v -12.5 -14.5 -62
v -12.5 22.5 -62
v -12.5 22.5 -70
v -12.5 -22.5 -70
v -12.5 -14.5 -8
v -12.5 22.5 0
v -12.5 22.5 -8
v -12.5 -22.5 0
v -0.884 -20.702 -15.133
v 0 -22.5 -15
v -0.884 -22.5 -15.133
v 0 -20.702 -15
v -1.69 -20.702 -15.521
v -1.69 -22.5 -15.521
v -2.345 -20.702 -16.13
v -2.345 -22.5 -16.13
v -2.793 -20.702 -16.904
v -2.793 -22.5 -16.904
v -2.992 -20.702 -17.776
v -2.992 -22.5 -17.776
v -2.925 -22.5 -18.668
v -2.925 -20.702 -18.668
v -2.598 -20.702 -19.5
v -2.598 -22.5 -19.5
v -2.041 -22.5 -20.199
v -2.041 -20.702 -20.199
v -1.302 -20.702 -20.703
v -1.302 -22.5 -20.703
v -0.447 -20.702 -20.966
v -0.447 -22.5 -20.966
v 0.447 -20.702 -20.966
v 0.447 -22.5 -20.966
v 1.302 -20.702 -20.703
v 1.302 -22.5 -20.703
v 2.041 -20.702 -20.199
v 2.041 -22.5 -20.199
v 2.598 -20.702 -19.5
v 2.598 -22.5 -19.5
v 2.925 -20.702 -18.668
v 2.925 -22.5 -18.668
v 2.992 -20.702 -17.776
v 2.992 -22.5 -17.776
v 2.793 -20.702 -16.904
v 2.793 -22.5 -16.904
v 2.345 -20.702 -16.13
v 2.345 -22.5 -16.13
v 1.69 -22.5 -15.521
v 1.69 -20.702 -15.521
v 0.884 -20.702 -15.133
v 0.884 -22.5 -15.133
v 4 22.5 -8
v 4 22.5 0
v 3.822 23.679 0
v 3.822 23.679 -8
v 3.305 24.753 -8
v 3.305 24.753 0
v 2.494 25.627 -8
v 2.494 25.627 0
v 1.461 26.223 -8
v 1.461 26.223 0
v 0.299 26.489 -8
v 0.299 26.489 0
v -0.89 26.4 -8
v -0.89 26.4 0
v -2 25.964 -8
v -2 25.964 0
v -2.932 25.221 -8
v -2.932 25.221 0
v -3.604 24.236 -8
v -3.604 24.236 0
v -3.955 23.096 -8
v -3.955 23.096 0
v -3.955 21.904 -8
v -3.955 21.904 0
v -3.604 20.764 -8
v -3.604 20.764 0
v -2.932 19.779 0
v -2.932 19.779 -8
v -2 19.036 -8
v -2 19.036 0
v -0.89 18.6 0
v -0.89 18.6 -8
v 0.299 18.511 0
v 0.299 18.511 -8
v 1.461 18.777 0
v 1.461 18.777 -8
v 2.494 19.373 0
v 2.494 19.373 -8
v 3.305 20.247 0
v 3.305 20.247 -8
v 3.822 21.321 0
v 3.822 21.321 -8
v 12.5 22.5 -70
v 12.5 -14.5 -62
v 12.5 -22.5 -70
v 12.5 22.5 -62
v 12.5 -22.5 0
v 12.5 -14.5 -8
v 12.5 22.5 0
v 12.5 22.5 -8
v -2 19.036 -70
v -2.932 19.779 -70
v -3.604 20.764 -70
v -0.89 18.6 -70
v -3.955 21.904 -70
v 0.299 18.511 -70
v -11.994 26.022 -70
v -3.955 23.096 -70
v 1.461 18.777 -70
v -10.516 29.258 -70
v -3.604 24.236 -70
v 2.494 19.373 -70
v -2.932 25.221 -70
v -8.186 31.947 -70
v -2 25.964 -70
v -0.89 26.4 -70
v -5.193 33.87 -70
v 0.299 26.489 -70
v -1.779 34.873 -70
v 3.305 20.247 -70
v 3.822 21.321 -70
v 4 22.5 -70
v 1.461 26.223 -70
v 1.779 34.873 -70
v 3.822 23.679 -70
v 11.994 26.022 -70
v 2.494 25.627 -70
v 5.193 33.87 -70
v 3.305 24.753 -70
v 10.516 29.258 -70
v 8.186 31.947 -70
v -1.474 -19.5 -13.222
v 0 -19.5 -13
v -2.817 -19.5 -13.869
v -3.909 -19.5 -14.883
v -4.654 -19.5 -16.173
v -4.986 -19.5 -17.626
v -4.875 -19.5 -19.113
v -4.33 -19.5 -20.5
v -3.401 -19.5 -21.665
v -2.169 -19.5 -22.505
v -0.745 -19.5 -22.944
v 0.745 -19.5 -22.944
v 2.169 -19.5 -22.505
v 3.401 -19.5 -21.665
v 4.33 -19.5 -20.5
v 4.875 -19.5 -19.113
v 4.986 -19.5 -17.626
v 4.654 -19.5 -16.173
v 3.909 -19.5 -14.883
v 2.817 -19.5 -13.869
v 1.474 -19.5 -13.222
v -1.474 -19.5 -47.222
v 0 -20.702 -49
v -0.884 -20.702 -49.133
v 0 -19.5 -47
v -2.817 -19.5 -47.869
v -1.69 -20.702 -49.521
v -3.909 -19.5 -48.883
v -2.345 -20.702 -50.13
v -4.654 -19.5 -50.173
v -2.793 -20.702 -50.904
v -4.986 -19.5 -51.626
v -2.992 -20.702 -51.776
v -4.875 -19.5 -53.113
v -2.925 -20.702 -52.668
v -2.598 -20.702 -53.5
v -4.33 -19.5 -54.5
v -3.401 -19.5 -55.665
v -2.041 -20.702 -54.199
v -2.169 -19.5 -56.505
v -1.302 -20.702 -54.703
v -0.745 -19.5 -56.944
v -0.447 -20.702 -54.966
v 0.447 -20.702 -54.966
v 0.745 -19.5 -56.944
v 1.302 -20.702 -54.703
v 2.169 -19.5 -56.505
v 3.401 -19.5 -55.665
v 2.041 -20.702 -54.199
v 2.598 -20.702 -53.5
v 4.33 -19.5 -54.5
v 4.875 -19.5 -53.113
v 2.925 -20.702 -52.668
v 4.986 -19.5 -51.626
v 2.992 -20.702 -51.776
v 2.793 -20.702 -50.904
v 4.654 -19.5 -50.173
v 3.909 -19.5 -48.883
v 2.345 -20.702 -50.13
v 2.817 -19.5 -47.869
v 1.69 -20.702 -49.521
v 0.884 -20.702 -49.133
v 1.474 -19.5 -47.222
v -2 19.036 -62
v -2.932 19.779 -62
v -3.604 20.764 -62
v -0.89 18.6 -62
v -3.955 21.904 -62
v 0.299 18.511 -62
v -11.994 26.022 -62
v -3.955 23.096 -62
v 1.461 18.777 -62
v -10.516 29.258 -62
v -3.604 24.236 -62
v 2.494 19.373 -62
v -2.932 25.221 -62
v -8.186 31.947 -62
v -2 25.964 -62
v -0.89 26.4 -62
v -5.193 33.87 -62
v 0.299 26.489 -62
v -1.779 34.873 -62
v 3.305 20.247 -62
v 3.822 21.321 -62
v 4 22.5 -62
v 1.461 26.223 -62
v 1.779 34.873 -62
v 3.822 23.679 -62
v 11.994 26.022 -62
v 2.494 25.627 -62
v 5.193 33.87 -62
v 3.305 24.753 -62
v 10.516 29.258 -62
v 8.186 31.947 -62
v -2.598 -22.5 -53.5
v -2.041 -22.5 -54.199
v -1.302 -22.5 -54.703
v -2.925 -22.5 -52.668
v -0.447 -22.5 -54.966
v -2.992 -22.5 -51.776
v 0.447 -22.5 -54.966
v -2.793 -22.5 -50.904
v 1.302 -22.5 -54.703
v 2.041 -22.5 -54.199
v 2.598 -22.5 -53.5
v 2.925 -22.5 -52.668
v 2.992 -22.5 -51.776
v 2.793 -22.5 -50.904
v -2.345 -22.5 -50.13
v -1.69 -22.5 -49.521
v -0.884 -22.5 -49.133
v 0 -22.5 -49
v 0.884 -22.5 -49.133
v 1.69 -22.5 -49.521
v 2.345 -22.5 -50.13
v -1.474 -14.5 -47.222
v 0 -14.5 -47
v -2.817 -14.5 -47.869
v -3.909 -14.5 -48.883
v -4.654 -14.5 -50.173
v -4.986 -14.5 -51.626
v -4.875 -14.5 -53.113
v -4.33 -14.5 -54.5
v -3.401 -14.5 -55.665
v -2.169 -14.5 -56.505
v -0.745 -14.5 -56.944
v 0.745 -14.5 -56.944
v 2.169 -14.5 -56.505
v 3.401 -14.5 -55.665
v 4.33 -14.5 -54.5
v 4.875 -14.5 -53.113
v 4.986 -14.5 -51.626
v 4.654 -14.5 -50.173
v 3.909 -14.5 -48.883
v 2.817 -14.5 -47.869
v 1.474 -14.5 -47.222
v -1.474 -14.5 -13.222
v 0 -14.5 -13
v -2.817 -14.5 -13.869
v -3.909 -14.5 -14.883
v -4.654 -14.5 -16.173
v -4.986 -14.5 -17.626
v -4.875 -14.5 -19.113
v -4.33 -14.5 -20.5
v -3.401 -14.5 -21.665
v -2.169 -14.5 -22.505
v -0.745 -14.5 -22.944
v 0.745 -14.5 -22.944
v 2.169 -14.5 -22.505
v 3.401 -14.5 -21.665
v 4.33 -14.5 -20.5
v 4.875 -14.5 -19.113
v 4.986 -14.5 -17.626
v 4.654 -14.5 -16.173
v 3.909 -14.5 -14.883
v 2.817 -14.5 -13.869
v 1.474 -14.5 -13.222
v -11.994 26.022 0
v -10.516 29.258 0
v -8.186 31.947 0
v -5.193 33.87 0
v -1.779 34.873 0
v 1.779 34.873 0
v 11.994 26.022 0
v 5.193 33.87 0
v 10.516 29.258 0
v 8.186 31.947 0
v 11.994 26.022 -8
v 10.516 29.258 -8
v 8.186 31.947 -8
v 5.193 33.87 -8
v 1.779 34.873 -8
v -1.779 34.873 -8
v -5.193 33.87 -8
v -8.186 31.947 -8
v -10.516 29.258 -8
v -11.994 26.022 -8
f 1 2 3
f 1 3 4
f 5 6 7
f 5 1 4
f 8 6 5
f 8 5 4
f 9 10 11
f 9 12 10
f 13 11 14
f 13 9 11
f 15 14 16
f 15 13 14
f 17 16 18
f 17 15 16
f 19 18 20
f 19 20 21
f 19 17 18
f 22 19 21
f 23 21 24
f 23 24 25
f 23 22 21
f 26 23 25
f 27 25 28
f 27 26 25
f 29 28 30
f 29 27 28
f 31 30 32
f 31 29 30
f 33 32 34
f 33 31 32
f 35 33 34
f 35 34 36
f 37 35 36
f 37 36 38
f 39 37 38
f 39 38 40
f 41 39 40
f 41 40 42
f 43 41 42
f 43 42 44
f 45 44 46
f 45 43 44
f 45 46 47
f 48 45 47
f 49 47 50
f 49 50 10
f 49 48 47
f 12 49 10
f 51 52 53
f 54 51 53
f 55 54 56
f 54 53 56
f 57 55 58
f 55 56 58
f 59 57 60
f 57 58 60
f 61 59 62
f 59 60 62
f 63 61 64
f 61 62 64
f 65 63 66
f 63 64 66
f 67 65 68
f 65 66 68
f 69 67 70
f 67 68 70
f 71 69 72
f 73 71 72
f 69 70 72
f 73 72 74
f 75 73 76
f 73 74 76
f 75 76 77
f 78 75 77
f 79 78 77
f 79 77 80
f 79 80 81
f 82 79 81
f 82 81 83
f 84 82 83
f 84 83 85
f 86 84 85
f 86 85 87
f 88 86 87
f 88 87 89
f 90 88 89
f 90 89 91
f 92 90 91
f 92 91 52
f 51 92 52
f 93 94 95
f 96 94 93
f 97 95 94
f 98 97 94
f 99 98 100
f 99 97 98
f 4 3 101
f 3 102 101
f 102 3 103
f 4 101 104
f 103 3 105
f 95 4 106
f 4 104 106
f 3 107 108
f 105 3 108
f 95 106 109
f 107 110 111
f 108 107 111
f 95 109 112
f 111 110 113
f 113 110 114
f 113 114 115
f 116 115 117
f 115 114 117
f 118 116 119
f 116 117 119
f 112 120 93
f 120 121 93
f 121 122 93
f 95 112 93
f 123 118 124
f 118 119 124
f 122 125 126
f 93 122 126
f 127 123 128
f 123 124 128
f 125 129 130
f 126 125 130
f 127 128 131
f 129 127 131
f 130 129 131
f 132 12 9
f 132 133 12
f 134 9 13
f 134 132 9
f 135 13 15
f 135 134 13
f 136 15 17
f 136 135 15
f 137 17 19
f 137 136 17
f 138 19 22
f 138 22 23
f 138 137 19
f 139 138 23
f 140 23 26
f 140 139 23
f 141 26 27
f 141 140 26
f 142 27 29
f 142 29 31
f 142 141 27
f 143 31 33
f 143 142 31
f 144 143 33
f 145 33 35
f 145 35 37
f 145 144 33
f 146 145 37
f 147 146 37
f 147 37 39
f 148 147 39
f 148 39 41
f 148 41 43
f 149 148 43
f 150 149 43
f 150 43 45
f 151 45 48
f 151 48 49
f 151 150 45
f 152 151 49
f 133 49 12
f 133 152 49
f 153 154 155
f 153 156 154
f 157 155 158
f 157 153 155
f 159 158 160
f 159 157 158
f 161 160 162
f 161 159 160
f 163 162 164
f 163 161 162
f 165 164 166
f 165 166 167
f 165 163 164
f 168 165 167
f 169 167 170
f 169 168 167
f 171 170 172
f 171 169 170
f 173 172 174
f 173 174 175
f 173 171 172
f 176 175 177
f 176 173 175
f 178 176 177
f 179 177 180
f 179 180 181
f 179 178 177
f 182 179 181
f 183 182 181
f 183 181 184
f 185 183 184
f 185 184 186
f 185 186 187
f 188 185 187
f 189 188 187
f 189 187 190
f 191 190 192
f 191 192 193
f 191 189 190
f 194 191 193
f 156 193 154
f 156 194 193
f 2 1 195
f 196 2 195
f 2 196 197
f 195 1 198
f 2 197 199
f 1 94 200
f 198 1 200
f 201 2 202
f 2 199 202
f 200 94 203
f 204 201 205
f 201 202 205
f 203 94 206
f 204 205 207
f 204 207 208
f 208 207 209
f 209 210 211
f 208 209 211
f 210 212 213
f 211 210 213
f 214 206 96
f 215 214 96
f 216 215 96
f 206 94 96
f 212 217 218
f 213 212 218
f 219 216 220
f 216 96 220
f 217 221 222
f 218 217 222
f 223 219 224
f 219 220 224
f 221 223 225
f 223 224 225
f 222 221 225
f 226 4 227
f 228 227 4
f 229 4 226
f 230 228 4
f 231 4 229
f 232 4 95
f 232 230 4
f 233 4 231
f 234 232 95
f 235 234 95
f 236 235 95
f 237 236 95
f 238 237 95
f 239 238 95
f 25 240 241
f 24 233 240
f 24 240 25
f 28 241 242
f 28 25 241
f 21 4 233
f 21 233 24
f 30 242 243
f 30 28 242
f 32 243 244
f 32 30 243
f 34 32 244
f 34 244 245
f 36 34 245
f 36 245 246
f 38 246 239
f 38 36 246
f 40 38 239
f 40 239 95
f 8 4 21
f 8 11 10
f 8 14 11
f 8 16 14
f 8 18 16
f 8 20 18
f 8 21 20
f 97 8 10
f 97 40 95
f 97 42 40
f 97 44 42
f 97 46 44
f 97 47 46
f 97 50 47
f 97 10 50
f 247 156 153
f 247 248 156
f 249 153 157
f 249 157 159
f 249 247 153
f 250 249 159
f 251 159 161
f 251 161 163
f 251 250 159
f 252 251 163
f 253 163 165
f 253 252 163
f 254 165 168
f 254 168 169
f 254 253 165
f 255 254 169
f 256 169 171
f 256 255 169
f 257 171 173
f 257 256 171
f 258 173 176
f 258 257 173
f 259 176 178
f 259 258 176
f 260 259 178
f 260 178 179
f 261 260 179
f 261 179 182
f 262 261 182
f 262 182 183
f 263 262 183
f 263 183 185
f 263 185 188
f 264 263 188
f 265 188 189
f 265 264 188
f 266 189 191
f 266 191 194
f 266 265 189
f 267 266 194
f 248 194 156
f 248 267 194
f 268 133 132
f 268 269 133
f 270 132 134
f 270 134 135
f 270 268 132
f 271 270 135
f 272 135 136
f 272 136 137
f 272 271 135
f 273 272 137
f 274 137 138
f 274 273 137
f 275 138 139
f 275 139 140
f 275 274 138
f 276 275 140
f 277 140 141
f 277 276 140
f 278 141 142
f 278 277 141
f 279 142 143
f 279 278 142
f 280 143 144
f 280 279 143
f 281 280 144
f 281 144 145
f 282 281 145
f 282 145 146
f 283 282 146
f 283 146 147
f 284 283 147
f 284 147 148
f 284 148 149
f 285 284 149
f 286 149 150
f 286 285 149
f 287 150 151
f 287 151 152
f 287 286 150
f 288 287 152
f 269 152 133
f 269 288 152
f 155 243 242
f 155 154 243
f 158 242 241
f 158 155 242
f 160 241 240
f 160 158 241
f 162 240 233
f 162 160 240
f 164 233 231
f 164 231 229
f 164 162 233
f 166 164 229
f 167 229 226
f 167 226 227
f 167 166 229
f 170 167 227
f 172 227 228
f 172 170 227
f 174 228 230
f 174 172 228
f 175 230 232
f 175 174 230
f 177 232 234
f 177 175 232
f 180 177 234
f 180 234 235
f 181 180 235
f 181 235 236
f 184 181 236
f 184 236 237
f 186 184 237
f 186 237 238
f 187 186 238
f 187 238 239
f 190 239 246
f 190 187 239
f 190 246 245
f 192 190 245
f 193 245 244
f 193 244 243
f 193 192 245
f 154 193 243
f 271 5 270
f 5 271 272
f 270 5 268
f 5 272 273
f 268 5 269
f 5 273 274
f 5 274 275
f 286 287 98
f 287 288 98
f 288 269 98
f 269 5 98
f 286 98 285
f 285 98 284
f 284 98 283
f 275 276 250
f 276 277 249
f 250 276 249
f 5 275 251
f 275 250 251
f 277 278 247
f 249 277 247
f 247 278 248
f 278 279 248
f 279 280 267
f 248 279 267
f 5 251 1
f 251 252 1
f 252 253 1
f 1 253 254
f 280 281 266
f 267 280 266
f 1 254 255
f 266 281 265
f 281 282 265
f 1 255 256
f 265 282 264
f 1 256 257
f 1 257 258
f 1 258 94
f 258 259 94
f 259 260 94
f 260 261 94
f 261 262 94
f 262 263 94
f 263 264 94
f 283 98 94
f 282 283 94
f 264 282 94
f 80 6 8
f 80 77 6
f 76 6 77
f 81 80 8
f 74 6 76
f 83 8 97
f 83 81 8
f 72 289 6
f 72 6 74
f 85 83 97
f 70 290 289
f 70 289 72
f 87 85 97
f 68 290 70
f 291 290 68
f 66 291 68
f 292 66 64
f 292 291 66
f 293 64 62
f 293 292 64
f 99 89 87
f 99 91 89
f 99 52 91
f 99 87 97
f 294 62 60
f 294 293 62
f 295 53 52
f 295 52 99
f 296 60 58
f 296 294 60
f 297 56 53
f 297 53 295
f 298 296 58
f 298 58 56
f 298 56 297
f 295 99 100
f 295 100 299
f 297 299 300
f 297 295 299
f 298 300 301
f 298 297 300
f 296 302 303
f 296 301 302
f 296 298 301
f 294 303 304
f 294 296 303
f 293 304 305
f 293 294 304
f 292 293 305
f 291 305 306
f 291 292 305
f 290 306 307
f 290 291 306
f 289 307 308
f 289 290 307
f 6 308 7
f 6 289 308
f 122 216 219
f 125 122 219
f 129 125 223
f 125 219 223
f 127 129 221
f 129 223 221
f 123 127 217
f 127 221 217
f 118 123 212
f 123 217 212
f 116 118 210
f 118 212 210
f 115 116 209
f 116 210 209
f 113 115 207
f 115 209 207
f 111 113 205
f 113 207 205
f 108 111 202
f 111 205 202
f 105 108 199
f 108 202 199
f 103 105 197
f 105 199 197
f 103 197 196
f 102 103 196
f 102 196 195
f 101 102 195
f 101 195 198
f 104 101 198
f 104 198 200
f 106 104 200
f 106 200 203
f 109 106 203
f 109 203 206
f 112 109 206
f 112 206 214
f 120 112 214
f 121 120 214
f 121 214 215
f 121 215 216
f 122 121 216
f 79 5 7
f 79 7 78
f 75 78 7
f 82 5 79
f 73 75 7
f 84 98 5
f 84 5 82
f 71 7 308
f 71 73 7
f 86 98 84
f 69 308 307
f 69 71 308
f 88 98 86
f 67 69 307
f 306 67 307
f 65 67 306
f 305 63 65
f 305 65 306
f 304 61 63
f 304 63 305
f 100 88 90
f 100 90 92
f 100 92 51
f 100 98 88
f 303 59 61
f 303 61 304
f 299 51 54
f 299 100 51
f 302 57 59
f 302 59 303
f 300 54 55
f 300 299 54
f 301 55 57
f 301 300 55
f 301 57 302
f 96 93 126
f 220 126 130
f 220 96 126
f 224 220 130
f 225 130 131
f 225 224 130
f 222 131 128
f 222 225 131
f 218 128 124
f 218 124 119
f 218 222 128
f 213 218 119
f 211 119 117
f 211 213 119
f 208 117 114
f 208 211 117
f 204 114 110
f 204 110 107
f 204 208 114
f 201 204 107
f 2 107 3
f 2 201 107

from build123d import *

# Parameters (mm, degrees)
SKETCH1_R           = 4
BOSS_EXTRUDE1_DEPTH = 70
SKETCH2_W           = 54
SKETCH2_H           = 49.5
CUT_EXTRUDE1_DEPTH  = 35
HOLE1_AT_2_COUNT    = 2
HOLE1_AT_2_PITCH    = 34


with BuildPart() as part:
    # Sketch1 → Boss-Extrude1 (new body)
    with BuildSketch(Plane.XY):
        with BuildLine():
            Line((-12.5, 22.5), (-12.5, -22.5))
            Line((-12.5, -22.5), (12.5, -22.5))
            Line((12.5, -22.5), (12.5, 22.5))
            ThreePointArc((12.5, 22.5), (0, 35), (-12.5, 22.5))
        make_face()
        with Locations((0, 22.5)):
            Circle(SKETCH1_R, mode=Mode.SUBTRACT)
    extrude(amount=-BOSS_EXTRUDE1_DEPTH)

    # Sketch2 → Cut-Extrude1 (cut, symmetric)
    with BuildSketch(Plane(origin=(12.5, 0, 0), x_dir=(0, 0, -1), z_dir=(1, 0, 0))):
        with Locations((35, 10.25)):
            Rectangle(SKETCH2_W, SKETCH2_H)
    extrude(amount=CUT_EXTRUDE1_DEPTH, both=True, mode=Mode.SUBTRACT)

    # Sketch5 → Hole1 (revolve, cut)
    with BuildSketch(Plane(origin=(0, -14.5, -52), x_dir=(0, 0, 1), z_dir=(1, 0, 0))):
        Polygon((0, 0), (0, 8), (3, 8), (3, 6.201721238), (5, 5), (5, 0), align=None)
    hole1 = revolve(axis=Axis((0, -8.369976101, -52), (0, -1, 0)), mode=Mode.SUBTRACT)

    # Hole1 at 2: Hole1 ×2
    with Locations(*[(0, 0, i * HOLE1_AT_2_PITCH) for i in range(1, HOLE1_AT_2_COUNT)]):
        add(hole1, mode=Mode.SUBTRACT)


solid = part.part
